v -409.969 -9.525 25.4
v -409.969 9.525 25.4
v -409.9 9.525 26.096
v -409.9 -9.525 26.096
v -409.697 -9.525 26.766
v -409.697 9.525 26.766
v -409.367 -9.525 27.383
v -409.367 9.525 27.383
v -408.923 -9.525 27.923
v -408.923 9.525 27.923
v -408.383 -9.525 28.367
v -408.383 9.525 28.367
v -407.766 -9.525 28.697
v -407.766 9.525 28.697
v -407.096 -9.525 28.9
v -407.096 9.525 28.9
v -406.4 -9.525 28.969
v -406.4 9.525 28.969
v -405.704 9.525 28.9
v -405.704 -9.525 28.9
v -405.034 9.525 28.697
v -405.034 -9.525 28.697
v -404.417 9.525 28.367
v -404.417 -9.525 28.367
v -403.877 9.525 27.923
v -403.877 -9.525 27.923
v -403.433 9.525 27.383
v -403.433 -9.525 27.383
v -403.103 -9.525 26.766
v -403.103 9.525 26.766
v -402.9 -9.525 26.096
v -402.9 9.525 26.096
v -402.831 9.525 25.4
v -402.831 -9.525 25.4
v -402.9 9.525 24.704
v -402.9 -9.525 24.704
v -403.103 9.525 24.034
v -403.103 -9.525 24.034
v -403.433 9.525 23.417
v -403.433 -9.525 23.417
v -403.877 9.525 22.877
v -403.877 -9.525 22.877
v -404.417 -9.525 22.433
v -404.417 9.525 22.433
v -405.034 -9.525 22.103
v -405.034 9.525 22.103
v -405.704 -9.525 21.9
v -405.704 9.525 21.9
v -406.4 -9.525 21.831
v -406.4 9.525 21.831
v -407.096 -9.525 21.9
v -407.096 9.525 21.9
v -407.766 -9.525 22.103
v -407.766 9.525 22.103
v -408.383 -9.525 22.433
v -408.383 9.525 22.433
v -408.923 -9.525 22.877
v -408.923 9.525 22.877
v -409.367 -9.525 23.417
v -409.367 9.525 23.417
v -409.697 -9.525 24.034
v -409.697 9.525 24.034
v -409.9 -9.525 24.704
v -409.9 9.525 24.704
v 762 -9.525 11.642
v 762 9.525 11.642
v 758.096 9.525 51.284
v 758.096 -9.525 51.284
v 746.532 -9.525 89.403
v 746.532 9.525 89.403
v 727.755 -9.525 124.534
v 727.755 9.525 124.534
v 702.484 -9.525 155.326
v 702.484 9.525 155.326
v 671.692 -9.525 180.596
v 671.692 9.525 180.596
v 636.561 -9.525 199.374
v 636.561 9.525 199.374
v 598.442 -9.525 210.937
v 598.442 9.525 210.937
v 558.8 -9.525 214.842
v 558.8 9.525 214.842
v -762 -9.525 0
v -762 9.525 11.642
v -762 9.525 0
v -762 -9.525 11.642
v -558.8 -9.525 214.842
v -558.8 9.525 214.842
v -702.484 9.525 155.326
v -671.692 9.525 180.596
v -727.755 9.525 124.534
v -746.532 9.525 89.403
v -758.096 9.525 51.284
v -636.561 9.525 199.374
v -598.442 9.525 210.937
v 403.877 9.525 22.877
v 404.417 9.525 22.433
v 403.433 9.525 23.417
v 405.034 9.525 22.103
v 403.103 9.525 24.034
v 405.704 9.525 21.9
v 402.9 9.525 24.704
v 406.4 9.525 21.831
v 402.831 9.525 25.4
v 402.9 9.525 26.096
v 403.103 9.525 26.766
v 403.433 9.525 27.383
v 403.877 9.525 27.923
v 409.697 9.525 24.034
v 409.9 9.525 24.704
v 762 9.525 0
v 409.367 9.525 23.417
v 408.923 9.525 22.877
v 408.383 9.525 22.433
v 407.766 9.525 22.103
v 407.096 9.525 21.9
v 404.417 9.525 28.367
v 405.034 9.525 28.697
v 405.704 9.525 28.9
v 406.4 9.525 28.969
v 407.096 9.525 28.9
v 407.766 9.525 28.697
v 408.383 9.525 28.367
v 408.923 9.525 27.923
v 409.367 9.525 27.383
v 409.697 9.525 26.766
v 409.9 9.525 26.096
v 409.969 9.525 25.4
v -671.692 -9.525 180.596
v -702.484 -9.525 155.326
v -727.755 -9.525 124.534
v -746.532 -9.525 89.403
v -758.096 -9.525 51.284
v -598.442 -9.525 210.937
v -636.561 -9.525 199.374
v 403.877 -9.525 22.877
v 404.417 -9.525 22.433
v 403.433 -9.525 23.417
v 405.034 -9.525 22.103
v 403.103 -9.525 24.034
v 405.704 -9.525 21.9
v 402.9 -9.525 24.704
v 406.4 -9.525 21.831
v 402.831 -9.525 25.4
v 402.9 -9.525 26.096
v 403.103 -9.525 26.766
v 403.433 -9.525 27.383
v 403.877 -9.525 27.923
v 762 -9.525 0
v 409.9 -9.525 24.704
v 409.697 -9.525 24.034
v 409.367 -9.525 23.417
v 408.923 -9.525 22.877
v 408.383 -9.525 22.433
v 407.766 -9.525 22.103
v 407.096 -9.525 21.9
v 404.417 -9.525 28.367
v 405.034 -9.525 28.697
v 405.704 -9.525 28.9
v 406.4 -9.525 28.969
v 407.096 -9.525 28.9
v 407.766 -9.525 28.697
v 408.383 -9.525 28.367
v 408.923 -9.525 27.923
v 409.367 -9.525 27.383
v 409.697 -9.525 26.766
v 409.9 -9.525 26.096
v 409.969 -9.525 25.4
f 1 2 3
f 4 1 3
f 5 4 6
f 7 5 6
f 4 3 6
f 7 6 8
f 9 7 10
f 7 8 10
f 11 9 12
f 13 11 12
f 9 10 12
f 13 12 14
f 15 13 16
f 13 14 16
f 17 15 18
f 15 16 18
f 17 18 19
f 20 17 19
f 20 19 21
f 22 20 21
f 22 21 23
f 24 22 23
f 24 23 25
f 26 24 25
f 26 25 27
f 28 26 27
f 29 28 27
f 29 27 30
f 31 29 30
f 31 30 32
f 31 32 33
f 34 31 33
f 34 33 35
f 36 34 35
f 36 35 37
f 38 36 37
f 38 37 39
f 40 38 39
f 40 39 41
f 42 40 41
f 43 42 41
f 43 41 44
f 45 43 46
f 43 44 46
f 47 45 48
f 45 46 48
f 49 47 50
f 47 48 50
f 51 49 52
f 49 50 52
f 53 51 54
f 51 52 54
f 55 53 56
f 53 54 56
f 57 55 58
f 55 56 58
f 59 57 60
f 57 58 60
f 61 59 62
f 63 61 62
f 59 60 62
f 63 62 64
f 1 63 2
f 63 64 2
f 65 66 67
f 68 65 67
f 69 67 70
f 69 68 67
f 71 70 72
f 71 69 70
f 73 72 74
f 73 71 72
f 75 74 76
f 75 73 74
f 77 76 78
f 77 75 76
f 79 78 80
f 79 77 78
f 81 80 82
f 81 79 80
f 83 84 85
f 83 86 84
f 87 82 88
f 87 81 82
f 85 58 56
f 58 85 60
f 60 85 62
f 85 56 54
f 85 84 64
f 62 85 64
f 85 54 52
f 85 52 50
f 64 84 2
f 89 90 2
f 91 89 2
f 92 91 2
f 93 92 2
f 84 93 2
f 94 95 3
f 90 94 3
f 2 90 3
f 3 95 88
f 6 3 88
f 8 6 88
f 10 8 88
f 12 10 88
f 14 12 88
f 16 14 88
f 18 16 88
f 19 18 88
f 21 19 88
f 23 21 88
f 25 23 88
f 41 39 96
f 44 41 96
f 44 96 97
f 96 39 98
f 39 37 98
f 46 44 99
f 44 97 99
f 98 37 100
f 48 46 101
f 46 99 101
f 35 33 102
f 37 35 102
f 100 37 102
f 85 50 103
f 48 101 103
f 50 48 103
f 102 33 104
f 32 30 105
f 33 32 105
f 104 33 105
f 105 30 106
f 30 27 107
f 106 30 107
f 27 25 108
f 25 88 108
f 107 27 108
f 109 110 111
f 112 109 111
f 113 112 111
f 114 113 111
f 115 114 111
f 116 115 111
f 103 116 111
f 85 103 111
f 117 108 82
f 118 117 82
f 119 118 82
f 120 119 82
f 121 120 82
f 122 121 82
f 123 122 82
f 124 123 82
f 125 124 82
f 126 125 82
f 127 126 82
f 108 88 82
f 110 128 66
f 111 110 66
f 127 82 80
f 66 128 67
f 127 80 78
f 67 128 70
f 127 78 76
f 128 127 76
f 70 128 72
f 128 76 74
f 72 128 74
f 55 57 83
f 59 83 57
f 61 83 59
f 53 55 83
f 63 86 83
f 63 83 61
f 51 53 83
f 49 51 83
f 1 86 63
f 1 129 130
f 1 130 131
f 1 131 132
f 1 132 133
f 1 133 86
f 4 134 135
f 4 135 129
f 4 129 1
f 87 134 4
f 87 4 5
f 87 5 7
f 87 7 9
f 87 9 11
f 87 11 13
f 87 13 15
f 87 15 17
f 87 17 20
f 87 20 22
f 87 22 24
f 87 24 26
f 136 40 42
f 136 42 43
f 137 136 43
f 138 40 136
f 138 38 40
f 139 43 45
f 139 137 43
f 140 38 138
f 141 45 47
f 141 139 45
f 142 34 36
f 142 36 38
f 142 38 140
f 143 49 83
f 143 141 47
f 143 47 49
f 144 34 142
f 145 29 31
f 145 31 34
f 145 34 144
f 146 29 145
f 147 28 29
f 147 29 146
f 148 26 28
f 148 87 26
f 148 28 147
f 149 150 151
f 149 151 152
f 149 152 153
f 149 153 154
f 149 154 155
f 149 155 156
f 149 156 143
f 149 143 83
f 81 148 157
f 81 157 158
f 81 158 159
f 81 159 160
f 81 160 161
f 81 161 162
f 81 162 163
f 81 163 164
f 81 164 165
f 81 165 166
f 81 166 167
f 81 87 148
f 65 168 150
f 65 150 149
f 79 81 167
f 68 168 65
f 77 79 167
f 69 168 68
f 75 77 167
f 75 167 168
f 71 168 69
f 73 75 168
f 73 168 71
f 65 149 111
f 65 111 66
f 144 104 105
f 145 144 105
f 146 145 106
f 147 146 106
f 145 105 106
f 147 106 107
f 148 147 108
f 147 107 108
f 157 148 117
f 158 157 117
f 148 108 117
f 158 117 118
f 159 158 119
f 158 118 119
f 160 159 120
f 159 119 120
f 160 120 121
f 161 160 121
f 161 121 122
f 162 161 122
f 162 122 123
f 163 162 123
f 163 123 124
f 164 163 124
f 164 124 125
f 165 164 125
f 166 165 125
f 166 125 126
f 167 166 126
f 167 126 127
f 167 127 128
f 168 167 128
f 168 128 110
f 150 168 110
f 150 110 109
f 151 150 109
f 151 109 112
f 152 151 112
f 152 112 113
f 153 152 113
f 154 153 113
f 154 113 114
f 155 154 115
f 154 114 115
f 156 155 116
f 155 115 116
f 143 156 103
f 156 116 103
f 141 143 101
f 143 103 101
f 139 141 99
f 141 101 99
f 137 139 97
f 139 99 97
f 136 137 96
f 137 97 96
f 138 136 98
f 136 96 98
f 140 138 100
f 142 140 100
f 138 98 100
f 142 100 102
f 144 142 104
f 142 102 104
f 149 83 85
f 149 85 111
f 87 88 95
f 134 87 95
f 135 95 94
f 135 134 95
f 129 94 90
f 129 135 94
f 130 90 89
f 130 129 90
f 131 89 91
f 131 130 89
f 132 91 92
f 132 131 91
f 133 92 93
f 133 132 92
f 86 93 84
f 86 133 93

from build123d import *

# Parameters (mm, degrees)
F1_DEPTH      = 9.525
F1_DEPTH_BACK = 9.525
F3_D          = 7.1374


with BuildPart() as f1:
    # F0 (on Front) → F1 (new body, two sides)
    with BuildSketch(Plane.XZ) as f1_sk:
        with BuildLine():
            Line((-762, 11.6416666667), (-762, 0))
            Line((-762, 0), (762, 0))
            Line((762, 0), (762, 11.6416666667))
            ThreePointArc((762, 11.6416666667), (702.4840979371, 155.3257646038), (558.8, 214.8416666667))
            Line((558.8, 214.8416666667), (-558.8, 214.8416666667))
            ThreePointArc((-558.8, 214.8416666667), (-702.4840979371, 155.3257646038), (-762, 11.6416666667))
        make_face()
    extrude(amount=F1_DEPTH)
    extrude(f1_sk.sketch, amount=-F1_DEPTH_BACK)

    # F3 (through all)
    with Locations(Plane.XZ.offset(9.525)):
        with Locations((-406.4, 25.4), (406.4, 25.4)):
            Hole(F3_D / 2)


solid = f1.part
